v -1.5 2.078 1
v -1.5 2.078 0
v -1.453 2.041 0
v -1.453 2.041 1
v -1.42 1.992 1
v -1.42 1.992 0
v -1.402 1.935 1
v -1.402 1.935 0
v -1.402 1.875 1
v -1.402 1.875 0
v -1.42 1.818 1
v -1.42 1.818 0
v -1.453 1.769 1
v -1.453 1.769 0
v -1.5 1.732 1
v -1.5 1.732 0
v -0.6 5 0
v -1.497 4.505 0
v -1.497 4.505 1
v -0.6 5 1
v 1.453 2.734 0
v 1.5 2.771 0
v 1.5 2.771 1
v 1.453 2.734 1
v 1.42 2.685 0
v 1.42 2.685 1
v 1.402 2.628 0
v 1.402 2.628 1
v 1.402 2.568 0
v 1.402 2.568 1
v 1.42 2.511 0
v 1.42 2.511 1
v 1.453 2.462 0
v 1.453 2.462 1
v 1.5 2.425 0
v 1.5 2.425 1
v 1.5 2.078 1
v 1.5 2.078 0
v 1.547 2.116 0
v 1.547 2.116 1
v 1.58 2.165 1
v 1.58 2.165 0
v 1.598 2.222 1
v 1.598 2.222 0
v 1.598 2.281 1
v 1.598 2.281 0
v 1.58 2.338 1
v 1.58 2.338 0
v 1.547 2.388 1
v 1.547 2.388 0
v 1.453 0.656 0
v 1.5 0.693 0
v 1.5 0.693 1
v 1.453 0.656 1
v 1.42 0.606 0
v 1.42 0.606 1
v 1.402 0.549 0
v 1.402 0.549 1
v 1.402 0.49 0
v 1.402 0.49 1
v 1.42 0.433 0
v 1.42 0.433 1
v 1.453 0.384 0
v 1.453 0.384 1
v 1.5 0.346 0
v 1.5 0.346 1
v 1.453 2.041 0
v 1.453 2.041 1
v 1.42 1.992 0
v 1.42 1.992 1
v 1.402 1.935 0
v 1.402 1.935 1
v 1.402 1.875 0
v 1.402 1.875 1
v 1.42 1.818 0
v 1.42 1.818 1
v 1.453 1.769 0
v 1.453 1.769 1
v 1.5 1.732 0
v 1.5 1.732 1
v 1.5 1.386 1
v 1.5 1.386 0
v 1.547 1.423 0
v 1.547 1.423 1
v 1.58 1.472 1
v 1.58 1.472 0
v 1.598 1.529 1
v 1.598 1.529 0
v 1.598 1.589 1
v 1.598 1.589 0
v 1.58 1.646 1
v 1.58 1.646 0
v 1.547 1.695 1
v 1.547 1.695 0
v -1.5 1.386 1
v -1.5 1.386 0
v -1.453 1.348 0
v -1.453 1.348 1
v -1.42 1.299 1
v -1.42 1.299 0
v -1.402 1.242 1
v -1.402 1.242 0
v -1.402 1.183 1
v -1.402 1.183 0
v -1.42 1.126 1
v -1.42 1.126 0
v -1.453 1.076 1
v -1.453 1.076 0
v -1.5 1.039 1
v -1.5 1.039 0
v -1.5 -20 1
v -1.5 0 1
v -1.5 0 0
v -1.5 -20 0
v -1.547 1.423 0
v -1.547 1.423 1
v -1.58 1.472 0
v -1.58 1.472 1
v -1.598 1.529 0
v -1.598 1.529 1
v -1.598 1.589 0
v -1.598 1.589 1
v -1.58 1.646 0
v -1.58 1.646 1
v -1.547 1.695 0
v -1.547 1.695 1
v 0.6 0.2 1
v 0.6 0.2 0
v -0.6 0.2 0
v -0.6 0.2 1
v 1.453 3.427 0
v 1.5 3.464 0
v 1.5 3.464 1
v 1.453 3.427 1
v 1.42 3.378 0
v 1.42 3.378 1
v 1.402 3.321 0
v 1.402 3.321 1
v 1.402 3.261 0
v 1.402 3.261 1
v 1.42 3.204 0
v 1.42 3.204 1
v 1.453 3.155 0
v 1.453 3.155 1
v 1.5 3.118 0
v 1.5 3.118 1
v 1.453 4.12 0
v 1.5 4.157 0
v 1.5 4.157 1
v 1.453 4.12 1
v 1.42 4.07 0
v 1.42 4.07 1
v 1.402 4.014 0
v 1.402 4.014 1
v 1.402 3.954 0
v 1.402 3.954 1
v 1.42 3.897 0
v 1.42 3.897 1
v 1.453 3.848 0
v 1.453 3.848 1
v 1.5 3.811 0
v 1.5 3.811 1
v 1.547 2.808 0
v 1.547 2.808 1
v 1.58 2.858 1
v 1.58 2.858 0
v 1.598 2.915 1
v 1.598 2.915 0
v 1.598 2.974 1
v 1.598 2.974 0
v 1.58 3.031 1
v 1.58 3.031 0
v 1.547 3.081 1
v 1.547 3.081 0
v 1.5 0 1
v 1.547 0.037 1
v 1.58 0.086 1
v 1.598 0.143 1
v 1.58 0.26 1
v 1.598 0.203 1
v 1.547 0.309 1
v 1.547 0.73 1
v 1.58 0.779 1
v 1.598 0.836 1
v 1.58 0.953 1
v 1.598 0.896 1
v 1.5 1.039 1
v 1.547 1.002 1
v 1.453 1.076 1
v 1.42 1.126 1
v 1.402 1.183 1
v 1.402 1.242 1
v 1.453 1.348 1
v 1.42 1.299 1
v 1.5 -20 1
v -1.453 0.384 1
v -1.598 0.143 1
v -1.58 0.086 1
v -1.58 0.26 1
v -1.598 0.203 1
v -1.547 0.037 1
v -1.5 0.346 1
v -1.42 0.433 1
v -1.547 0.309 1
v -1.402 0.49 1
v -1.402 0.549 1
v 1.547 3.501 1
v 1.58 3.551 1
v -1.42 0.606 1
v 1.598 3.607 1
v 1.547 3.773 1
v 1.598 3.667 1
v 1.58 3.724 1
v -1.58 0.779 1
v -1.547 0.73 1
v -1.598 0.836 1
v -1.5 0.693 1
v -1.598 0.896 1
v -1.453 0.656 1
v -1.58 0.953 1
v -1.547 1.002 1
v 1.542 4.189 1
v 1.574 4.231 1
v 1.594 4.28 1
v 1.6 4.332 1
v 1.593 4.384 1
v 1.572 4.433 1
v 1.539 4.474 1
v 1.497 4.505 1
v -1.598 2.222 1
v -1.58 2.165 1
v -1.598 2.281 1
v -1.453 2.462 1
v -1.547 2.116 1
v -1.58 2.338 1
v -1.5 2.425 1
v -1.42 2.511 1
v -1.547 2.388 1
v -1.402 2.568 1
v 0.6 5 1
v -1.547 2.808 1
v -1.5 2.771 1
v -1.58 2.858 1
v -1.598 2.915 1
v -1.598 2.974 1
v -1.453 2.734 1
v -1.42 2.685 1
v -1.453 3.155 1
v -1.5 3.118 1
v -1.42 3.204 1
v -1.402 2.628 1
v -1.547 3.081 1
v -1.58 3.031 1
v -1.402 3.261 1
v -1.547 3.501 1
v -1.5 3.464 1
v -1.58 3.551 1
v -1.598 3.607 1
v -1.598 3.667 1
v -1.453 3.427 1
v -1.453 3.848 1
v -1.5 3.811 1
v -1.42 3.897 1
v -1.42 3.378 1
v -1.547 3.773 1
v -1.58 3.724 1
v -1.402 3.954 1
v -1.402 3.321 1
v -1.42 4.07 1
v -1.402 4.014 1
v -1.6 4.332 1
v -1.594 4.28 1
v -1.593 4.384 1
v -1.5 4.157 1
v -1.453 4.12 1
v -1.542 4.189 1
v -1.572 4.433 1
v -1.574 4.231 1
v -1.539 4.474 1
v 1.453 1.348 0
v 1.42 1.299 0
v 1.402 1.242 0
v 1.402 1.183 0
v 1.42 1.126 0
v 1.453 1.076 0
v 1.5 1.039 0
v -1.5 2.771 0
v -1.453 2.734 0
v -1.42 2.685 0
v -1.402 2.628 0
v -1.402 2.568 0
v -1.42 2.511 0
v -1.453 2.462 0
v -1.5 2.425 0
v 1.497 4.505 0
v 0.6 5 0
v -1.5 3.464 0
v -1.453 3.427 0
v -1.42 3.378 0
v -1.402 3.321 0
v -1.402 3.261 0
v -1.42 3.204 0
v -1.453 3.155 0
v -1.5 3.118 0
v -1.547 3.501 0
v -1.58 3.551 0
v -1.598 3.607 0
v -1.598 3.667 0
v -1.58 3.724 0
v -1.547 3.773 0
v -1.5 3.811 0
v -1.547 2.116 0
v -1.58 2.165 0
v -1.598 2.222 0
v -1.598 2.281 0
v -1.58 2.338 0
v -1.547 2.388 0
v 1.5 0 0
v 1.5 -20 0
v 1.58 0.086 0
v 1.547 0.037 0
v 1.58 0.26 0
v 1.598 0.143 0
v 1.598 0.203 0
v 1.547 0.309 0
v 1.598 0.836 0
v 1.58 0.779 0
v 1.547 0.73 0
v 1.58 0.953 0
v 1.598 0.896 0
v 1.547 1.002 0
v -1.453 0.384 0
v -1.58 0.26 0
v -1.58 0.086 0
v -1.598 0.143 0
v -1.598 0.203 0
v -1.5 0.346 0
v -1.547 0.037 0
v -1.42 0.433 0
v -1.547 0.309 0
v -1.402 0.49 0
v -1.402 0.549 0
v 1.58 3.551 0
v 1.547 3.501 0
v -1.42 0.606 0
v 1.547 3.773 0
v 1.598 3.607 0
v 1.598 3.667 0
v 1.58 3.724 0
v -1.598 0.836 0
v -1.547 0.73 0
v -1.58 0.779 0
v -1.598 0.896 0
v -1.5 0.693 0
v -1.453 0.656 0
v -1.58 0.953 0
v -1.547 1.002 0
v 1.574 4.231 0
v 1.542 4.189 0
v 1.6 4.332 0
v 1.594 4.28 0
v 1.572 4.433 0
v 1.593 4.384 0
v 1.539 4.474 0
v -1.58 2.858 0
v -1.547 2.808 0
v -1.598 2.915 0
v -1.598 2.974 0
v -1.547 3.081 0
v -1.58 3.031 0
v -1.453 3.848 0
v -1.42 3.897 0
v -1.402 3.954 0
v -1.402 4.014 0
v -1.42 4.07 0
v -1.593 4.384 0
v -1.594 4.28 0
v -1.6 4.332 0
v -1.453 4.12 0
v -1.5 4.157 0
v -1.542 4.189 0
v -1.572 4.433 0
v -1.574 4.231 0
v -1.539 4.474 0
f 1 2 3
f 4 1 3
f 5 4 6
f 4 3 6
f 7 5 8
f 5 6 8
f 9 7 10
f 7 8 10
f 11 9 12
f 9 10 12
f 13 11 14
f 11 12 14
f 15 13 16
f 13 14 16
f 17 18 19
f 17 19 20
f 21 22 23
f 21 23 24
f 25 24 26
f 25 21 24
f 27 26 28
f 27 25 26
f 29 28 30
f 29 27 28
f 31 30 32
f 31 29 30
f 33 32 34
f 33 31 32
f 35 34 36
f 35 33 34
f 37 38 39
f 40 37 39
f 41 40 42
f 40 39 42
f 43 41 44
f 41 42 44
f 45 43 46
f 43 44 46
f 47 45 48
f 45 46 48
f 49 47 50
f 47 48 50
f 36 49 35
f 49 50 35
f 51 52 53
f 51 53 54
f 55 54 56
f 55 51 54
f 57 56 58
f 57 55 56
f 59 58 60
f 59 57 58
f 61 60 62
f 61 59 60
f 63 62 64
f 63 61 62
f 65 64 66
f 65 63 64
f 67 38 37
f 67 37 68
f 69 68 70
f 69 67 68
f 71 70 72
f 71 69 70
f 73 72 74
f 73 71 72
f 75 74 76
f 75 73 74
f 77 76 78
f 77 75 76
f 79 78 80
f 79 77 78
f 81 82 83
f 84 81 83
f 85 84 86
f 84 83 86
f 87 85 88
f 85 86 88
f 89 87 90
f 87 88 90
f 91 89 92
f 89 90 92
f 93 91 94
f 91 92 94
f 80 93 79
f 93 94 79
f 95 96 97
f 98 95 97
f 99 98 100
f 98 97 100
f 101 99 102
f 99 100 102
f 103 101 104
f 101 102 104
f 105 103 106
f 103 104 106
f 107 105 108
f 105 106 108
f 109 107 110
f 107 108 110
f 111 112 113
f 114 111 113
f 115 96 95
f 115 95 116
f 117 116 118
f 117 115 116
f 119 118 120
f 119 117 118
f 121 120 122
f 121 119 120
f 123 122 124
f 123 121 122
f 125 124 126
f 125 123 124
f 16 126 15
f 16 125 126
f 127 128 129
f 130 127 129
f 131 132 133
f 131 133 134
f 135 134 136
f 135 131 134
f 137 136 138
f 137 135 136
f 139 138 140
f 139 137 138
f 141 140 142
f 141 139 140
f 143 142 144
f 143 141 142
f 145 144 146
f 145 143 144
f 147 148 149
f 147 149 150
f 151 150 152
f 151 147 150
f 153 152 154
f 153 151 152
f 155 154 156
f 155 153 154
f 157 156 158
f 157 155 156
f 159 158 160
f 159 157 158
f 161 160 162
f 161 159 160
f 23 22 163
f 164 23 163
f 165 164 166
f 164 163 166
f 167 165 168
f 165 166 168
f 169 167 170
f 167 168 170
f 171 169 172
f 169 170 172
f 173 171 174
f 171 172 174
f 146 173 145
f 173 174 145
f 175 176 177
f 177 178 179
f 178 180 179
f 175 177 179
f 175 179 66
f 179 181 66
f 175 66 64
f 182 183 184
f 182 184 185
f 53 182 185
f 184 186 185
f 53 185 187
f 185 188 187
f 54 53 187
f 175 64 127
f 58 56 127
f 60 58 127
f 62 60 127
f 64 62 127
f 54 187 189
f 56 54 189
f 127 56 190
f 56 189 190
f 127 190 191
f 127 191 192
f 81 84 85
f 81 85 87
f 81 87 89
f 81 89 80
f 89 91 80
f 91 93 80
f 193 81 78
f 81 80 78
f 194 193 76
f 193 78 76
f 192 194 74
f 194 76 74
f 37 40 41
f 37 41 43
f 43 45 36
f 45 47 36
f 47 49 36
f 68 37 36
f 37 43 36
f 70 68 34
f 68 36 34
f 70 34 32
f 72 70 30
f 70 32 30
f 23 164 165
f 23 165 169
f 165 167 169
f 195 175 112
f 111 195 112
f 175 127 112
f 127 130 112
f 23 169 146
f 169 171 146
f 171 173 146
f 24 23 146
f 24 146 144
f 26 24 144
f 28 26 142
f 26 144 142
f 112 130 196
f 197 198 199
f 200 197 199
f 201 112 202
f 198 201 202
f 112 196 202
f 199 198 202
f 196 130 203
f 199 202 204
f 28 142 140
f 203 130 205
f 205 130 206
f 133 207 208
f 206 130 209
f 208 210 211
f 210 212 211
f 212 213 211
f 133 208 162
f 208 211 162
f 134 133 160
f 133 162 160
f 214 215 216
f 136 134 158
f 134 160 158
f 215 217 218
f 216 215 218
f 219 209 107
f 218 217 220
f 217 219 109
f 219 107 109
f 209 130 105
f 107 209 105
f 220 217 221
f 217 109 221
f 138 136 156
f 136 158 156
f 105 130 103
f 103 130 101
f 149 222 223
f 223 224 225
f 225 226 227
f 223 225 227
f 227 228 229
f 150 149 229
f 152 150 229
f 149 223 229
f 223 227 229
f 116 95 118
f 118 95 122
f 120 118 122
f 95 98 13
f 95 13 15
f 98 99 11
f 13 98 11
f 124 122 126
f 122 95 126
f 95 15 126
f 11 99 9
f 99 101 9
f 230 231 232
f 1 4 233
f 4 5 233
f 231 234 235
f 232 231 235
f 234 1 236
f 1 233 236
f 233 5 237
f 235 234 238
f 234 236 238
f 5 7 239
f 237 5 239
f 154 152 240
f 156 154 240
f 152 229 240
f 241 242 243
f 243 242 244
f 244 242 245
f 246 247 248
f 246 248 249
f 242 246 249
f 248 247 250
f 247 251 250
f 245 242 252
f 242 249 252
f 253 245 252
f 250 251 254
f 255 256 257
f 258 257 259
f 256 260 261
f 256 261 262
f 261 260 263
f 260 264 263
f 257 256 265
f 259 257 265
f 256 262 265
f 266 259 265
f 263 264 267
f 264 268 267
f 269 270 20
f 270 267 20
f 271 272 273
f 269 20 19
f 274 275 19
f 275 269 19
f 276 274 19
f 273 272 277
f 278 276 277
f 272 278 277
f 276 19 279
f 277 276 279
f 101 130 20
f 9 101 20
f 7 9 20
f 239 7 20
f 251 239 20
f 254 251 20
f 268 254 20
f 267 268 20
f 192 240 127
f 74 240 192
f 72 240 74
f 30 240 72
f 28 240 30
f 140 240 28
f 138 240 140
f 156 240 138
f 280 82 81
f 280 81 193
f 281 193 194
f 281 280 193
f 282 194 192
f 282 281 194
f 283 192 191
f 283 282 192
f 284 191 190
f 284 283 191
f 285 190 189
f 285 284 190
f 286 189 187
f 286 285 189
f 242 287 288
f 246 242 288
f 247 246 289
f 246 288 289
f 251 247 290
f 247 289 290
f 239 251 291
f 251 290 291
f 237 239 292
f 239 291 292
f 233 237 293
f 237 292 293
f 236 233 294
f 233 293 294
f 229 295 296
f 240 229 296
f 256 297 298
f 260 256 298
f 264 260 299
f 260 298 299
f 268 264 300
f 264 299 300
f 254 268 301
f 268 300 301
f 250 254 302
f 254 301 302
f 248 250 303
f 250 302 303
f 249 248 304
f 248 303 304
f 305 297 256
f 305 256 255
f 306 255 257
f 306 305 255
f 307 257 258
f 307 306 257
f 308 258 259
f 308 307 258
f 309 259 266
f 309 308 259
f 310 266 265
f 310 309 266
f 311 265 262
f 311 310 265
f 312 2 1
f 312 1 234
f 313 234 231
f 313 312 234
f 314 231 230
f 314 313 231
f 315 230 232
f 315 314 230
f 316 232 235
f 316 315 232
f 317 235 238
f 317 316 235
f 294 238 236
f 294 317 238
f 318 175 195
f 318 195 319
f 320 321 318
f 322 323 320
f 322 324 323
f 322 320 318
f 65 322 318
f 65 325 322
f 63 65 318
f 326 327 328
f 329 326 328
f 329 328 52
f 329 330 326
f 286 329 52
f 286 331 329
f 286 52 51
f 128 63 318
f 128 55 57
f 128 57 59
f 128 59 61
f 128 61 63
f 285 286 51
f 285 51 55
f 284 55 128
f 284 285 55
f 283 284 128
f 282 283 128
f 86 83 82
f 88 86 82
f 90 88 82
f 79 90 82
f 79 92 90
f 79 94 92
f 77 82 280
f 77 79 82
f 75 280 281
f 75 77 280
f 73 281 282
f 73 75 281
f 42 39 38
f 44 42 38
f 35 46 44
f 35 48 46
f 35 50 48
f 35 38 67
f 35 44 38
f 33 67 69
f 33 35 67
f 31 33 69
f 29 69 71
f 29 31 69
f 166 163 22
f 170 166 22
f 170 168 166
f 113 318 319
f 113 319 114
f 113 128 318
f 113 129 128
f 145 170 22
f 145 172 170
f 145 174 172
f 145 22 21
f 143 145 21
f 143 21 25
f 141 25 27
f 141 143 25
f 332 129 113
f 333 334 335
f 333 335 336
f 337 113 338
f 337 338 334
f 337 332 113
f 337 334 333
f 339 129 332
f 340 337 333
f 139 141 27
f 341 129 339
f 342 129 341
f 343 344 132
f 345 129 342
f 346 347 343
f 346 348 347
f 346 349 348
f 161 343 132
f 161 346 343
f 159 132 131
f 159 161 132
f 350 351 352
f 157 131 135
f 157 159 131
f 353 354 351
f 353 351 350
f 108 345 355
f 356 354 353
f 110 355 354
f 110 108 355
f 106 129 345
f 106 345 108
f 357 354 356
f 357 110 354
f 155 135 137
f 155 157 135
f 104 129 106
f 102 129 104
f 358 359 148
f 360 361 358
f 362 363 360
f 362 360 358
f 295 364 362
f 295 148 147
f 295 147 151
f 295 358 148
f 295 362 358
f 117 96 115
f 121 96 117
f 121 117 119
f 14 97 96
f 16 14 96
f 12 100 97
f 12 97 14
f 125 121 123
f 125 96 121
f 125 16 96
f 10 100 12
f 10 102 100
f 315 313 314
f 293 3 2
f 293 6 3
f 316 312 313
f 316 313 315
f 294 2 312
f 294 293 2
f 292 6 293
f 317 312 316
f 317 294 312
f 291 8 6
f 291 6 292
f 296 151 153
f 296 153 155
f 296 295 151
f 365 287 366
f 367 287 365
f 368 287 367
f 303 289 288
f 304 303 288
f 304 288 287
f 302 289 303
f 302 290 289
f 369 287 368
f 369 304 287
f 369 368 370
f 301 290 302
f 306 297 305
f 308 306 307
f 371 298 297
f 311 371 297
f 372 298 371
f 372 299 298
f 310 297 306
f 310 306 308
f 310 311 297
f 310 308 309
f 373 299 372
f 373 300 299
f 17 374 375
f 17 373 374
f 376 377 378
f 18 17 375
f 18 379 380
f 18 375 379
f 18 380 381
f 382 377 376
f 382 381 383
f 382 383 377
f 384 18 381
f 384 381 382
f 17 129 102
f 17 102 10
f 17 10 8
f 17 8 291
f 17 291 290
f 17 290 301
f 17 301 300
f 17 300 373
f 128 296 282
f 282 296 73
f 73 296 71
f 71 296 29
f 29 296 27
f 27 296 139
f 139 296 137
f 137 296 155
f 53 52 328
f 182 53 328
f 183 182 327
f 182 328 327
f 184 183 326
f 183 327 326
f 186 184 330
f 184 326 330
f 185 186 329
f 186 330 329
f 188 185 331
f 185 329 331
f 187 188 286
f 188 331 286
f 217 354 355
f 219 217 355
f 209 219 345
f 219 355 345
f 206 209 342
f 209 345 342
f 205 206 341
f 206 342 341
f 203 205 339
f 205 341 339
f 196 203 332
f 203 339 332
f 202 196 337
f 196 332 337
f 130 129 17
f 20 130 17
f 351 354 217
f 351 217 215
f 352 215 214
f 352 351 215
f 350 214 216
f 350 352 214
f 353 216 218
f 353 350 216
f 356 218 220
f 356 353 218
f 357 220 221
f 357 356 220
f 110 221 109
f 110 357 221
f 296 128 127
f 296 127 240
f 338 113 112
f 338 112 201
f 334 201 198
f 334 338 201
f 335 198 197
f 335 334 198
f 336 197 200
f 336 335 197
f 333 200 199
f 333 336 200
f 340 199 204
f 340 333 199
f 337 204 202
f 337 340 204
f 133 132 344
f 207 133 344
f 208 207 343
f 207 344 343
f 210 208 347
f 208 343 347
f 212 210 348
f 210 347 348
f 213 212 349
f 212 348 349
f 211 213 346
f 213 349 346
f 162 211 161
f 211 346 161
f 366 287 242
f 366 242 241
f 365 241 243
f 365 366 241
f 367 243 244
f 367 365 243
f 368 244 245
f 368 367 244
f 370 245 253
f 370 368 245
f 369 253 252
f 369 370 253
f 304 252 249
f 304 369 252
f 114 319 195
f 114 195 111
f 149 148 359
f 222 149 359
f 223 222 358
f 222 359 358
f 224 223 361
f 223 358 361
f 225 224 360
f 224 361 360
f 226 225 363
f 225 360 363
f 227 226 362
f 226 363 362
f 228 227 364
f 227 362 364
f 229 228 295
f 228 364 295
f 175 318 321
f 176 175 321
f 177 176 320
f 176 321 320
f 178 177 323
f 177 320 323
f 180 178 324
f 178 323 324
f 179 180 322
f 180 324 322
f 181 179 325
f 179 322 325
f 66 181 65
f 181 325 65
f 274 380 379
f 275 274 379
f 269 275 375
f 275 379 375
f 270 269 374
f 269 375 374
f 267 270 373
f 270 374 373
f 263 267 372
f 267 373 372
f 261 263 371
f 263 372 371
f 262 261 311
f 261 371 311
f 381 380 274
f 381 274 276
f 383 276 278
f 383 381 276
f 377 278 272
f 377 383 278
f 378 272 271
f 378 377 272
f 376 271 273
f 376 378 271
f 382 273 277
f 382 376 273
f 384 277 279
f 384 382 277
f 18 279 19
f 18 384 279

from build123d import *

# Parameters (mm, degrees)
PAD007_DEPTH         = 1
MIRRORED007_FACE34_W = 3
MIRRORED007_FACE34_H = 1
PAD008_DEPTH         = 20


with BuildPart() as part:
    # Sketch008 → Pad007 (new body)
    with BuildSketch(Plane.XY):
        with BuildLine():
            Line((0, 0.2), (0.6, 0.2))
            Line((0.6, 0.2), (0.6, 5))
            Line((1.496626, 4.505237), (0.6, 5))
            ThreePointArc((1.5, 4.156922), (1.599991, 4.332064), (1.496626, 4.505237))
            ThreePointArc((1.5, 4.156922), (1.4, 3.983717), (1.5, 3.810512))
            ThreePointArc((1.5, 3.464102), (1.6, 3.637307), (1.5, 3.810512))
            ThreePointArc((1.5, 3.464102), (1.4, 3.290897), (1.5, 3.117691))
            ThreePointArc((1.5, 2.771281), (1.6, 2.944486), (1.5, 3.117691))
            ThreePointArc((1.5, 2.771281), (1.4, 2.598076), (1.5, 2.424871))
            ThreePointArc((1.5, 2.078461), (1.6, 2.251666), (1.5, 2.424871))
            ThreePointArc((1.5, 2.078461), (1.4, 1.905256), (1.5, 1.732051))
            ThreePointArc((1.5, 1.385641), (1.6, 1.558846), (1.5, 1.732051))
            ThreePointArc((1.5, 1.385641), (1.4, 1.212436), (1.5, 1.03923))
            ThreePointArc((1.5, 0.69282), (1.6, 0.866025), (1.5, 1.03923))
            ThreePointArc((1.5, 0.69282), (1.4, 0.519615), (1.5, 0.34641))
            ThreePointArc((1.5, 0), (1.6, 0.173205), (1.5, 0.34641))
            Line((0, 0), (1.5, 0))
            Line((0, 0), (0, 0.2))
        make_face()
    pad007 = extrude(amount=PAD007_DEPTH)

    # Mirrored007: Pad007 across Sketch008 V_Axis
    add(pad007.mirror(Plane(origin=(0, 0, 0), x_dir=(0, 0, 1), z_dir=(1, 0, 0))))

    # Mirrored007 Face34 → Pad008 (add)
    with BuildSketch(Plane(origin=(0, 0, 0.5), x_dir=(-1, 0, 0), z_dir=(0, -1, 0))):
        Rectangle(MIRRORED007_FACE34_W, MIRRORED007_FACE34_H)
    extrude(amount=PAD008_DEPTH)


solid = part.part
